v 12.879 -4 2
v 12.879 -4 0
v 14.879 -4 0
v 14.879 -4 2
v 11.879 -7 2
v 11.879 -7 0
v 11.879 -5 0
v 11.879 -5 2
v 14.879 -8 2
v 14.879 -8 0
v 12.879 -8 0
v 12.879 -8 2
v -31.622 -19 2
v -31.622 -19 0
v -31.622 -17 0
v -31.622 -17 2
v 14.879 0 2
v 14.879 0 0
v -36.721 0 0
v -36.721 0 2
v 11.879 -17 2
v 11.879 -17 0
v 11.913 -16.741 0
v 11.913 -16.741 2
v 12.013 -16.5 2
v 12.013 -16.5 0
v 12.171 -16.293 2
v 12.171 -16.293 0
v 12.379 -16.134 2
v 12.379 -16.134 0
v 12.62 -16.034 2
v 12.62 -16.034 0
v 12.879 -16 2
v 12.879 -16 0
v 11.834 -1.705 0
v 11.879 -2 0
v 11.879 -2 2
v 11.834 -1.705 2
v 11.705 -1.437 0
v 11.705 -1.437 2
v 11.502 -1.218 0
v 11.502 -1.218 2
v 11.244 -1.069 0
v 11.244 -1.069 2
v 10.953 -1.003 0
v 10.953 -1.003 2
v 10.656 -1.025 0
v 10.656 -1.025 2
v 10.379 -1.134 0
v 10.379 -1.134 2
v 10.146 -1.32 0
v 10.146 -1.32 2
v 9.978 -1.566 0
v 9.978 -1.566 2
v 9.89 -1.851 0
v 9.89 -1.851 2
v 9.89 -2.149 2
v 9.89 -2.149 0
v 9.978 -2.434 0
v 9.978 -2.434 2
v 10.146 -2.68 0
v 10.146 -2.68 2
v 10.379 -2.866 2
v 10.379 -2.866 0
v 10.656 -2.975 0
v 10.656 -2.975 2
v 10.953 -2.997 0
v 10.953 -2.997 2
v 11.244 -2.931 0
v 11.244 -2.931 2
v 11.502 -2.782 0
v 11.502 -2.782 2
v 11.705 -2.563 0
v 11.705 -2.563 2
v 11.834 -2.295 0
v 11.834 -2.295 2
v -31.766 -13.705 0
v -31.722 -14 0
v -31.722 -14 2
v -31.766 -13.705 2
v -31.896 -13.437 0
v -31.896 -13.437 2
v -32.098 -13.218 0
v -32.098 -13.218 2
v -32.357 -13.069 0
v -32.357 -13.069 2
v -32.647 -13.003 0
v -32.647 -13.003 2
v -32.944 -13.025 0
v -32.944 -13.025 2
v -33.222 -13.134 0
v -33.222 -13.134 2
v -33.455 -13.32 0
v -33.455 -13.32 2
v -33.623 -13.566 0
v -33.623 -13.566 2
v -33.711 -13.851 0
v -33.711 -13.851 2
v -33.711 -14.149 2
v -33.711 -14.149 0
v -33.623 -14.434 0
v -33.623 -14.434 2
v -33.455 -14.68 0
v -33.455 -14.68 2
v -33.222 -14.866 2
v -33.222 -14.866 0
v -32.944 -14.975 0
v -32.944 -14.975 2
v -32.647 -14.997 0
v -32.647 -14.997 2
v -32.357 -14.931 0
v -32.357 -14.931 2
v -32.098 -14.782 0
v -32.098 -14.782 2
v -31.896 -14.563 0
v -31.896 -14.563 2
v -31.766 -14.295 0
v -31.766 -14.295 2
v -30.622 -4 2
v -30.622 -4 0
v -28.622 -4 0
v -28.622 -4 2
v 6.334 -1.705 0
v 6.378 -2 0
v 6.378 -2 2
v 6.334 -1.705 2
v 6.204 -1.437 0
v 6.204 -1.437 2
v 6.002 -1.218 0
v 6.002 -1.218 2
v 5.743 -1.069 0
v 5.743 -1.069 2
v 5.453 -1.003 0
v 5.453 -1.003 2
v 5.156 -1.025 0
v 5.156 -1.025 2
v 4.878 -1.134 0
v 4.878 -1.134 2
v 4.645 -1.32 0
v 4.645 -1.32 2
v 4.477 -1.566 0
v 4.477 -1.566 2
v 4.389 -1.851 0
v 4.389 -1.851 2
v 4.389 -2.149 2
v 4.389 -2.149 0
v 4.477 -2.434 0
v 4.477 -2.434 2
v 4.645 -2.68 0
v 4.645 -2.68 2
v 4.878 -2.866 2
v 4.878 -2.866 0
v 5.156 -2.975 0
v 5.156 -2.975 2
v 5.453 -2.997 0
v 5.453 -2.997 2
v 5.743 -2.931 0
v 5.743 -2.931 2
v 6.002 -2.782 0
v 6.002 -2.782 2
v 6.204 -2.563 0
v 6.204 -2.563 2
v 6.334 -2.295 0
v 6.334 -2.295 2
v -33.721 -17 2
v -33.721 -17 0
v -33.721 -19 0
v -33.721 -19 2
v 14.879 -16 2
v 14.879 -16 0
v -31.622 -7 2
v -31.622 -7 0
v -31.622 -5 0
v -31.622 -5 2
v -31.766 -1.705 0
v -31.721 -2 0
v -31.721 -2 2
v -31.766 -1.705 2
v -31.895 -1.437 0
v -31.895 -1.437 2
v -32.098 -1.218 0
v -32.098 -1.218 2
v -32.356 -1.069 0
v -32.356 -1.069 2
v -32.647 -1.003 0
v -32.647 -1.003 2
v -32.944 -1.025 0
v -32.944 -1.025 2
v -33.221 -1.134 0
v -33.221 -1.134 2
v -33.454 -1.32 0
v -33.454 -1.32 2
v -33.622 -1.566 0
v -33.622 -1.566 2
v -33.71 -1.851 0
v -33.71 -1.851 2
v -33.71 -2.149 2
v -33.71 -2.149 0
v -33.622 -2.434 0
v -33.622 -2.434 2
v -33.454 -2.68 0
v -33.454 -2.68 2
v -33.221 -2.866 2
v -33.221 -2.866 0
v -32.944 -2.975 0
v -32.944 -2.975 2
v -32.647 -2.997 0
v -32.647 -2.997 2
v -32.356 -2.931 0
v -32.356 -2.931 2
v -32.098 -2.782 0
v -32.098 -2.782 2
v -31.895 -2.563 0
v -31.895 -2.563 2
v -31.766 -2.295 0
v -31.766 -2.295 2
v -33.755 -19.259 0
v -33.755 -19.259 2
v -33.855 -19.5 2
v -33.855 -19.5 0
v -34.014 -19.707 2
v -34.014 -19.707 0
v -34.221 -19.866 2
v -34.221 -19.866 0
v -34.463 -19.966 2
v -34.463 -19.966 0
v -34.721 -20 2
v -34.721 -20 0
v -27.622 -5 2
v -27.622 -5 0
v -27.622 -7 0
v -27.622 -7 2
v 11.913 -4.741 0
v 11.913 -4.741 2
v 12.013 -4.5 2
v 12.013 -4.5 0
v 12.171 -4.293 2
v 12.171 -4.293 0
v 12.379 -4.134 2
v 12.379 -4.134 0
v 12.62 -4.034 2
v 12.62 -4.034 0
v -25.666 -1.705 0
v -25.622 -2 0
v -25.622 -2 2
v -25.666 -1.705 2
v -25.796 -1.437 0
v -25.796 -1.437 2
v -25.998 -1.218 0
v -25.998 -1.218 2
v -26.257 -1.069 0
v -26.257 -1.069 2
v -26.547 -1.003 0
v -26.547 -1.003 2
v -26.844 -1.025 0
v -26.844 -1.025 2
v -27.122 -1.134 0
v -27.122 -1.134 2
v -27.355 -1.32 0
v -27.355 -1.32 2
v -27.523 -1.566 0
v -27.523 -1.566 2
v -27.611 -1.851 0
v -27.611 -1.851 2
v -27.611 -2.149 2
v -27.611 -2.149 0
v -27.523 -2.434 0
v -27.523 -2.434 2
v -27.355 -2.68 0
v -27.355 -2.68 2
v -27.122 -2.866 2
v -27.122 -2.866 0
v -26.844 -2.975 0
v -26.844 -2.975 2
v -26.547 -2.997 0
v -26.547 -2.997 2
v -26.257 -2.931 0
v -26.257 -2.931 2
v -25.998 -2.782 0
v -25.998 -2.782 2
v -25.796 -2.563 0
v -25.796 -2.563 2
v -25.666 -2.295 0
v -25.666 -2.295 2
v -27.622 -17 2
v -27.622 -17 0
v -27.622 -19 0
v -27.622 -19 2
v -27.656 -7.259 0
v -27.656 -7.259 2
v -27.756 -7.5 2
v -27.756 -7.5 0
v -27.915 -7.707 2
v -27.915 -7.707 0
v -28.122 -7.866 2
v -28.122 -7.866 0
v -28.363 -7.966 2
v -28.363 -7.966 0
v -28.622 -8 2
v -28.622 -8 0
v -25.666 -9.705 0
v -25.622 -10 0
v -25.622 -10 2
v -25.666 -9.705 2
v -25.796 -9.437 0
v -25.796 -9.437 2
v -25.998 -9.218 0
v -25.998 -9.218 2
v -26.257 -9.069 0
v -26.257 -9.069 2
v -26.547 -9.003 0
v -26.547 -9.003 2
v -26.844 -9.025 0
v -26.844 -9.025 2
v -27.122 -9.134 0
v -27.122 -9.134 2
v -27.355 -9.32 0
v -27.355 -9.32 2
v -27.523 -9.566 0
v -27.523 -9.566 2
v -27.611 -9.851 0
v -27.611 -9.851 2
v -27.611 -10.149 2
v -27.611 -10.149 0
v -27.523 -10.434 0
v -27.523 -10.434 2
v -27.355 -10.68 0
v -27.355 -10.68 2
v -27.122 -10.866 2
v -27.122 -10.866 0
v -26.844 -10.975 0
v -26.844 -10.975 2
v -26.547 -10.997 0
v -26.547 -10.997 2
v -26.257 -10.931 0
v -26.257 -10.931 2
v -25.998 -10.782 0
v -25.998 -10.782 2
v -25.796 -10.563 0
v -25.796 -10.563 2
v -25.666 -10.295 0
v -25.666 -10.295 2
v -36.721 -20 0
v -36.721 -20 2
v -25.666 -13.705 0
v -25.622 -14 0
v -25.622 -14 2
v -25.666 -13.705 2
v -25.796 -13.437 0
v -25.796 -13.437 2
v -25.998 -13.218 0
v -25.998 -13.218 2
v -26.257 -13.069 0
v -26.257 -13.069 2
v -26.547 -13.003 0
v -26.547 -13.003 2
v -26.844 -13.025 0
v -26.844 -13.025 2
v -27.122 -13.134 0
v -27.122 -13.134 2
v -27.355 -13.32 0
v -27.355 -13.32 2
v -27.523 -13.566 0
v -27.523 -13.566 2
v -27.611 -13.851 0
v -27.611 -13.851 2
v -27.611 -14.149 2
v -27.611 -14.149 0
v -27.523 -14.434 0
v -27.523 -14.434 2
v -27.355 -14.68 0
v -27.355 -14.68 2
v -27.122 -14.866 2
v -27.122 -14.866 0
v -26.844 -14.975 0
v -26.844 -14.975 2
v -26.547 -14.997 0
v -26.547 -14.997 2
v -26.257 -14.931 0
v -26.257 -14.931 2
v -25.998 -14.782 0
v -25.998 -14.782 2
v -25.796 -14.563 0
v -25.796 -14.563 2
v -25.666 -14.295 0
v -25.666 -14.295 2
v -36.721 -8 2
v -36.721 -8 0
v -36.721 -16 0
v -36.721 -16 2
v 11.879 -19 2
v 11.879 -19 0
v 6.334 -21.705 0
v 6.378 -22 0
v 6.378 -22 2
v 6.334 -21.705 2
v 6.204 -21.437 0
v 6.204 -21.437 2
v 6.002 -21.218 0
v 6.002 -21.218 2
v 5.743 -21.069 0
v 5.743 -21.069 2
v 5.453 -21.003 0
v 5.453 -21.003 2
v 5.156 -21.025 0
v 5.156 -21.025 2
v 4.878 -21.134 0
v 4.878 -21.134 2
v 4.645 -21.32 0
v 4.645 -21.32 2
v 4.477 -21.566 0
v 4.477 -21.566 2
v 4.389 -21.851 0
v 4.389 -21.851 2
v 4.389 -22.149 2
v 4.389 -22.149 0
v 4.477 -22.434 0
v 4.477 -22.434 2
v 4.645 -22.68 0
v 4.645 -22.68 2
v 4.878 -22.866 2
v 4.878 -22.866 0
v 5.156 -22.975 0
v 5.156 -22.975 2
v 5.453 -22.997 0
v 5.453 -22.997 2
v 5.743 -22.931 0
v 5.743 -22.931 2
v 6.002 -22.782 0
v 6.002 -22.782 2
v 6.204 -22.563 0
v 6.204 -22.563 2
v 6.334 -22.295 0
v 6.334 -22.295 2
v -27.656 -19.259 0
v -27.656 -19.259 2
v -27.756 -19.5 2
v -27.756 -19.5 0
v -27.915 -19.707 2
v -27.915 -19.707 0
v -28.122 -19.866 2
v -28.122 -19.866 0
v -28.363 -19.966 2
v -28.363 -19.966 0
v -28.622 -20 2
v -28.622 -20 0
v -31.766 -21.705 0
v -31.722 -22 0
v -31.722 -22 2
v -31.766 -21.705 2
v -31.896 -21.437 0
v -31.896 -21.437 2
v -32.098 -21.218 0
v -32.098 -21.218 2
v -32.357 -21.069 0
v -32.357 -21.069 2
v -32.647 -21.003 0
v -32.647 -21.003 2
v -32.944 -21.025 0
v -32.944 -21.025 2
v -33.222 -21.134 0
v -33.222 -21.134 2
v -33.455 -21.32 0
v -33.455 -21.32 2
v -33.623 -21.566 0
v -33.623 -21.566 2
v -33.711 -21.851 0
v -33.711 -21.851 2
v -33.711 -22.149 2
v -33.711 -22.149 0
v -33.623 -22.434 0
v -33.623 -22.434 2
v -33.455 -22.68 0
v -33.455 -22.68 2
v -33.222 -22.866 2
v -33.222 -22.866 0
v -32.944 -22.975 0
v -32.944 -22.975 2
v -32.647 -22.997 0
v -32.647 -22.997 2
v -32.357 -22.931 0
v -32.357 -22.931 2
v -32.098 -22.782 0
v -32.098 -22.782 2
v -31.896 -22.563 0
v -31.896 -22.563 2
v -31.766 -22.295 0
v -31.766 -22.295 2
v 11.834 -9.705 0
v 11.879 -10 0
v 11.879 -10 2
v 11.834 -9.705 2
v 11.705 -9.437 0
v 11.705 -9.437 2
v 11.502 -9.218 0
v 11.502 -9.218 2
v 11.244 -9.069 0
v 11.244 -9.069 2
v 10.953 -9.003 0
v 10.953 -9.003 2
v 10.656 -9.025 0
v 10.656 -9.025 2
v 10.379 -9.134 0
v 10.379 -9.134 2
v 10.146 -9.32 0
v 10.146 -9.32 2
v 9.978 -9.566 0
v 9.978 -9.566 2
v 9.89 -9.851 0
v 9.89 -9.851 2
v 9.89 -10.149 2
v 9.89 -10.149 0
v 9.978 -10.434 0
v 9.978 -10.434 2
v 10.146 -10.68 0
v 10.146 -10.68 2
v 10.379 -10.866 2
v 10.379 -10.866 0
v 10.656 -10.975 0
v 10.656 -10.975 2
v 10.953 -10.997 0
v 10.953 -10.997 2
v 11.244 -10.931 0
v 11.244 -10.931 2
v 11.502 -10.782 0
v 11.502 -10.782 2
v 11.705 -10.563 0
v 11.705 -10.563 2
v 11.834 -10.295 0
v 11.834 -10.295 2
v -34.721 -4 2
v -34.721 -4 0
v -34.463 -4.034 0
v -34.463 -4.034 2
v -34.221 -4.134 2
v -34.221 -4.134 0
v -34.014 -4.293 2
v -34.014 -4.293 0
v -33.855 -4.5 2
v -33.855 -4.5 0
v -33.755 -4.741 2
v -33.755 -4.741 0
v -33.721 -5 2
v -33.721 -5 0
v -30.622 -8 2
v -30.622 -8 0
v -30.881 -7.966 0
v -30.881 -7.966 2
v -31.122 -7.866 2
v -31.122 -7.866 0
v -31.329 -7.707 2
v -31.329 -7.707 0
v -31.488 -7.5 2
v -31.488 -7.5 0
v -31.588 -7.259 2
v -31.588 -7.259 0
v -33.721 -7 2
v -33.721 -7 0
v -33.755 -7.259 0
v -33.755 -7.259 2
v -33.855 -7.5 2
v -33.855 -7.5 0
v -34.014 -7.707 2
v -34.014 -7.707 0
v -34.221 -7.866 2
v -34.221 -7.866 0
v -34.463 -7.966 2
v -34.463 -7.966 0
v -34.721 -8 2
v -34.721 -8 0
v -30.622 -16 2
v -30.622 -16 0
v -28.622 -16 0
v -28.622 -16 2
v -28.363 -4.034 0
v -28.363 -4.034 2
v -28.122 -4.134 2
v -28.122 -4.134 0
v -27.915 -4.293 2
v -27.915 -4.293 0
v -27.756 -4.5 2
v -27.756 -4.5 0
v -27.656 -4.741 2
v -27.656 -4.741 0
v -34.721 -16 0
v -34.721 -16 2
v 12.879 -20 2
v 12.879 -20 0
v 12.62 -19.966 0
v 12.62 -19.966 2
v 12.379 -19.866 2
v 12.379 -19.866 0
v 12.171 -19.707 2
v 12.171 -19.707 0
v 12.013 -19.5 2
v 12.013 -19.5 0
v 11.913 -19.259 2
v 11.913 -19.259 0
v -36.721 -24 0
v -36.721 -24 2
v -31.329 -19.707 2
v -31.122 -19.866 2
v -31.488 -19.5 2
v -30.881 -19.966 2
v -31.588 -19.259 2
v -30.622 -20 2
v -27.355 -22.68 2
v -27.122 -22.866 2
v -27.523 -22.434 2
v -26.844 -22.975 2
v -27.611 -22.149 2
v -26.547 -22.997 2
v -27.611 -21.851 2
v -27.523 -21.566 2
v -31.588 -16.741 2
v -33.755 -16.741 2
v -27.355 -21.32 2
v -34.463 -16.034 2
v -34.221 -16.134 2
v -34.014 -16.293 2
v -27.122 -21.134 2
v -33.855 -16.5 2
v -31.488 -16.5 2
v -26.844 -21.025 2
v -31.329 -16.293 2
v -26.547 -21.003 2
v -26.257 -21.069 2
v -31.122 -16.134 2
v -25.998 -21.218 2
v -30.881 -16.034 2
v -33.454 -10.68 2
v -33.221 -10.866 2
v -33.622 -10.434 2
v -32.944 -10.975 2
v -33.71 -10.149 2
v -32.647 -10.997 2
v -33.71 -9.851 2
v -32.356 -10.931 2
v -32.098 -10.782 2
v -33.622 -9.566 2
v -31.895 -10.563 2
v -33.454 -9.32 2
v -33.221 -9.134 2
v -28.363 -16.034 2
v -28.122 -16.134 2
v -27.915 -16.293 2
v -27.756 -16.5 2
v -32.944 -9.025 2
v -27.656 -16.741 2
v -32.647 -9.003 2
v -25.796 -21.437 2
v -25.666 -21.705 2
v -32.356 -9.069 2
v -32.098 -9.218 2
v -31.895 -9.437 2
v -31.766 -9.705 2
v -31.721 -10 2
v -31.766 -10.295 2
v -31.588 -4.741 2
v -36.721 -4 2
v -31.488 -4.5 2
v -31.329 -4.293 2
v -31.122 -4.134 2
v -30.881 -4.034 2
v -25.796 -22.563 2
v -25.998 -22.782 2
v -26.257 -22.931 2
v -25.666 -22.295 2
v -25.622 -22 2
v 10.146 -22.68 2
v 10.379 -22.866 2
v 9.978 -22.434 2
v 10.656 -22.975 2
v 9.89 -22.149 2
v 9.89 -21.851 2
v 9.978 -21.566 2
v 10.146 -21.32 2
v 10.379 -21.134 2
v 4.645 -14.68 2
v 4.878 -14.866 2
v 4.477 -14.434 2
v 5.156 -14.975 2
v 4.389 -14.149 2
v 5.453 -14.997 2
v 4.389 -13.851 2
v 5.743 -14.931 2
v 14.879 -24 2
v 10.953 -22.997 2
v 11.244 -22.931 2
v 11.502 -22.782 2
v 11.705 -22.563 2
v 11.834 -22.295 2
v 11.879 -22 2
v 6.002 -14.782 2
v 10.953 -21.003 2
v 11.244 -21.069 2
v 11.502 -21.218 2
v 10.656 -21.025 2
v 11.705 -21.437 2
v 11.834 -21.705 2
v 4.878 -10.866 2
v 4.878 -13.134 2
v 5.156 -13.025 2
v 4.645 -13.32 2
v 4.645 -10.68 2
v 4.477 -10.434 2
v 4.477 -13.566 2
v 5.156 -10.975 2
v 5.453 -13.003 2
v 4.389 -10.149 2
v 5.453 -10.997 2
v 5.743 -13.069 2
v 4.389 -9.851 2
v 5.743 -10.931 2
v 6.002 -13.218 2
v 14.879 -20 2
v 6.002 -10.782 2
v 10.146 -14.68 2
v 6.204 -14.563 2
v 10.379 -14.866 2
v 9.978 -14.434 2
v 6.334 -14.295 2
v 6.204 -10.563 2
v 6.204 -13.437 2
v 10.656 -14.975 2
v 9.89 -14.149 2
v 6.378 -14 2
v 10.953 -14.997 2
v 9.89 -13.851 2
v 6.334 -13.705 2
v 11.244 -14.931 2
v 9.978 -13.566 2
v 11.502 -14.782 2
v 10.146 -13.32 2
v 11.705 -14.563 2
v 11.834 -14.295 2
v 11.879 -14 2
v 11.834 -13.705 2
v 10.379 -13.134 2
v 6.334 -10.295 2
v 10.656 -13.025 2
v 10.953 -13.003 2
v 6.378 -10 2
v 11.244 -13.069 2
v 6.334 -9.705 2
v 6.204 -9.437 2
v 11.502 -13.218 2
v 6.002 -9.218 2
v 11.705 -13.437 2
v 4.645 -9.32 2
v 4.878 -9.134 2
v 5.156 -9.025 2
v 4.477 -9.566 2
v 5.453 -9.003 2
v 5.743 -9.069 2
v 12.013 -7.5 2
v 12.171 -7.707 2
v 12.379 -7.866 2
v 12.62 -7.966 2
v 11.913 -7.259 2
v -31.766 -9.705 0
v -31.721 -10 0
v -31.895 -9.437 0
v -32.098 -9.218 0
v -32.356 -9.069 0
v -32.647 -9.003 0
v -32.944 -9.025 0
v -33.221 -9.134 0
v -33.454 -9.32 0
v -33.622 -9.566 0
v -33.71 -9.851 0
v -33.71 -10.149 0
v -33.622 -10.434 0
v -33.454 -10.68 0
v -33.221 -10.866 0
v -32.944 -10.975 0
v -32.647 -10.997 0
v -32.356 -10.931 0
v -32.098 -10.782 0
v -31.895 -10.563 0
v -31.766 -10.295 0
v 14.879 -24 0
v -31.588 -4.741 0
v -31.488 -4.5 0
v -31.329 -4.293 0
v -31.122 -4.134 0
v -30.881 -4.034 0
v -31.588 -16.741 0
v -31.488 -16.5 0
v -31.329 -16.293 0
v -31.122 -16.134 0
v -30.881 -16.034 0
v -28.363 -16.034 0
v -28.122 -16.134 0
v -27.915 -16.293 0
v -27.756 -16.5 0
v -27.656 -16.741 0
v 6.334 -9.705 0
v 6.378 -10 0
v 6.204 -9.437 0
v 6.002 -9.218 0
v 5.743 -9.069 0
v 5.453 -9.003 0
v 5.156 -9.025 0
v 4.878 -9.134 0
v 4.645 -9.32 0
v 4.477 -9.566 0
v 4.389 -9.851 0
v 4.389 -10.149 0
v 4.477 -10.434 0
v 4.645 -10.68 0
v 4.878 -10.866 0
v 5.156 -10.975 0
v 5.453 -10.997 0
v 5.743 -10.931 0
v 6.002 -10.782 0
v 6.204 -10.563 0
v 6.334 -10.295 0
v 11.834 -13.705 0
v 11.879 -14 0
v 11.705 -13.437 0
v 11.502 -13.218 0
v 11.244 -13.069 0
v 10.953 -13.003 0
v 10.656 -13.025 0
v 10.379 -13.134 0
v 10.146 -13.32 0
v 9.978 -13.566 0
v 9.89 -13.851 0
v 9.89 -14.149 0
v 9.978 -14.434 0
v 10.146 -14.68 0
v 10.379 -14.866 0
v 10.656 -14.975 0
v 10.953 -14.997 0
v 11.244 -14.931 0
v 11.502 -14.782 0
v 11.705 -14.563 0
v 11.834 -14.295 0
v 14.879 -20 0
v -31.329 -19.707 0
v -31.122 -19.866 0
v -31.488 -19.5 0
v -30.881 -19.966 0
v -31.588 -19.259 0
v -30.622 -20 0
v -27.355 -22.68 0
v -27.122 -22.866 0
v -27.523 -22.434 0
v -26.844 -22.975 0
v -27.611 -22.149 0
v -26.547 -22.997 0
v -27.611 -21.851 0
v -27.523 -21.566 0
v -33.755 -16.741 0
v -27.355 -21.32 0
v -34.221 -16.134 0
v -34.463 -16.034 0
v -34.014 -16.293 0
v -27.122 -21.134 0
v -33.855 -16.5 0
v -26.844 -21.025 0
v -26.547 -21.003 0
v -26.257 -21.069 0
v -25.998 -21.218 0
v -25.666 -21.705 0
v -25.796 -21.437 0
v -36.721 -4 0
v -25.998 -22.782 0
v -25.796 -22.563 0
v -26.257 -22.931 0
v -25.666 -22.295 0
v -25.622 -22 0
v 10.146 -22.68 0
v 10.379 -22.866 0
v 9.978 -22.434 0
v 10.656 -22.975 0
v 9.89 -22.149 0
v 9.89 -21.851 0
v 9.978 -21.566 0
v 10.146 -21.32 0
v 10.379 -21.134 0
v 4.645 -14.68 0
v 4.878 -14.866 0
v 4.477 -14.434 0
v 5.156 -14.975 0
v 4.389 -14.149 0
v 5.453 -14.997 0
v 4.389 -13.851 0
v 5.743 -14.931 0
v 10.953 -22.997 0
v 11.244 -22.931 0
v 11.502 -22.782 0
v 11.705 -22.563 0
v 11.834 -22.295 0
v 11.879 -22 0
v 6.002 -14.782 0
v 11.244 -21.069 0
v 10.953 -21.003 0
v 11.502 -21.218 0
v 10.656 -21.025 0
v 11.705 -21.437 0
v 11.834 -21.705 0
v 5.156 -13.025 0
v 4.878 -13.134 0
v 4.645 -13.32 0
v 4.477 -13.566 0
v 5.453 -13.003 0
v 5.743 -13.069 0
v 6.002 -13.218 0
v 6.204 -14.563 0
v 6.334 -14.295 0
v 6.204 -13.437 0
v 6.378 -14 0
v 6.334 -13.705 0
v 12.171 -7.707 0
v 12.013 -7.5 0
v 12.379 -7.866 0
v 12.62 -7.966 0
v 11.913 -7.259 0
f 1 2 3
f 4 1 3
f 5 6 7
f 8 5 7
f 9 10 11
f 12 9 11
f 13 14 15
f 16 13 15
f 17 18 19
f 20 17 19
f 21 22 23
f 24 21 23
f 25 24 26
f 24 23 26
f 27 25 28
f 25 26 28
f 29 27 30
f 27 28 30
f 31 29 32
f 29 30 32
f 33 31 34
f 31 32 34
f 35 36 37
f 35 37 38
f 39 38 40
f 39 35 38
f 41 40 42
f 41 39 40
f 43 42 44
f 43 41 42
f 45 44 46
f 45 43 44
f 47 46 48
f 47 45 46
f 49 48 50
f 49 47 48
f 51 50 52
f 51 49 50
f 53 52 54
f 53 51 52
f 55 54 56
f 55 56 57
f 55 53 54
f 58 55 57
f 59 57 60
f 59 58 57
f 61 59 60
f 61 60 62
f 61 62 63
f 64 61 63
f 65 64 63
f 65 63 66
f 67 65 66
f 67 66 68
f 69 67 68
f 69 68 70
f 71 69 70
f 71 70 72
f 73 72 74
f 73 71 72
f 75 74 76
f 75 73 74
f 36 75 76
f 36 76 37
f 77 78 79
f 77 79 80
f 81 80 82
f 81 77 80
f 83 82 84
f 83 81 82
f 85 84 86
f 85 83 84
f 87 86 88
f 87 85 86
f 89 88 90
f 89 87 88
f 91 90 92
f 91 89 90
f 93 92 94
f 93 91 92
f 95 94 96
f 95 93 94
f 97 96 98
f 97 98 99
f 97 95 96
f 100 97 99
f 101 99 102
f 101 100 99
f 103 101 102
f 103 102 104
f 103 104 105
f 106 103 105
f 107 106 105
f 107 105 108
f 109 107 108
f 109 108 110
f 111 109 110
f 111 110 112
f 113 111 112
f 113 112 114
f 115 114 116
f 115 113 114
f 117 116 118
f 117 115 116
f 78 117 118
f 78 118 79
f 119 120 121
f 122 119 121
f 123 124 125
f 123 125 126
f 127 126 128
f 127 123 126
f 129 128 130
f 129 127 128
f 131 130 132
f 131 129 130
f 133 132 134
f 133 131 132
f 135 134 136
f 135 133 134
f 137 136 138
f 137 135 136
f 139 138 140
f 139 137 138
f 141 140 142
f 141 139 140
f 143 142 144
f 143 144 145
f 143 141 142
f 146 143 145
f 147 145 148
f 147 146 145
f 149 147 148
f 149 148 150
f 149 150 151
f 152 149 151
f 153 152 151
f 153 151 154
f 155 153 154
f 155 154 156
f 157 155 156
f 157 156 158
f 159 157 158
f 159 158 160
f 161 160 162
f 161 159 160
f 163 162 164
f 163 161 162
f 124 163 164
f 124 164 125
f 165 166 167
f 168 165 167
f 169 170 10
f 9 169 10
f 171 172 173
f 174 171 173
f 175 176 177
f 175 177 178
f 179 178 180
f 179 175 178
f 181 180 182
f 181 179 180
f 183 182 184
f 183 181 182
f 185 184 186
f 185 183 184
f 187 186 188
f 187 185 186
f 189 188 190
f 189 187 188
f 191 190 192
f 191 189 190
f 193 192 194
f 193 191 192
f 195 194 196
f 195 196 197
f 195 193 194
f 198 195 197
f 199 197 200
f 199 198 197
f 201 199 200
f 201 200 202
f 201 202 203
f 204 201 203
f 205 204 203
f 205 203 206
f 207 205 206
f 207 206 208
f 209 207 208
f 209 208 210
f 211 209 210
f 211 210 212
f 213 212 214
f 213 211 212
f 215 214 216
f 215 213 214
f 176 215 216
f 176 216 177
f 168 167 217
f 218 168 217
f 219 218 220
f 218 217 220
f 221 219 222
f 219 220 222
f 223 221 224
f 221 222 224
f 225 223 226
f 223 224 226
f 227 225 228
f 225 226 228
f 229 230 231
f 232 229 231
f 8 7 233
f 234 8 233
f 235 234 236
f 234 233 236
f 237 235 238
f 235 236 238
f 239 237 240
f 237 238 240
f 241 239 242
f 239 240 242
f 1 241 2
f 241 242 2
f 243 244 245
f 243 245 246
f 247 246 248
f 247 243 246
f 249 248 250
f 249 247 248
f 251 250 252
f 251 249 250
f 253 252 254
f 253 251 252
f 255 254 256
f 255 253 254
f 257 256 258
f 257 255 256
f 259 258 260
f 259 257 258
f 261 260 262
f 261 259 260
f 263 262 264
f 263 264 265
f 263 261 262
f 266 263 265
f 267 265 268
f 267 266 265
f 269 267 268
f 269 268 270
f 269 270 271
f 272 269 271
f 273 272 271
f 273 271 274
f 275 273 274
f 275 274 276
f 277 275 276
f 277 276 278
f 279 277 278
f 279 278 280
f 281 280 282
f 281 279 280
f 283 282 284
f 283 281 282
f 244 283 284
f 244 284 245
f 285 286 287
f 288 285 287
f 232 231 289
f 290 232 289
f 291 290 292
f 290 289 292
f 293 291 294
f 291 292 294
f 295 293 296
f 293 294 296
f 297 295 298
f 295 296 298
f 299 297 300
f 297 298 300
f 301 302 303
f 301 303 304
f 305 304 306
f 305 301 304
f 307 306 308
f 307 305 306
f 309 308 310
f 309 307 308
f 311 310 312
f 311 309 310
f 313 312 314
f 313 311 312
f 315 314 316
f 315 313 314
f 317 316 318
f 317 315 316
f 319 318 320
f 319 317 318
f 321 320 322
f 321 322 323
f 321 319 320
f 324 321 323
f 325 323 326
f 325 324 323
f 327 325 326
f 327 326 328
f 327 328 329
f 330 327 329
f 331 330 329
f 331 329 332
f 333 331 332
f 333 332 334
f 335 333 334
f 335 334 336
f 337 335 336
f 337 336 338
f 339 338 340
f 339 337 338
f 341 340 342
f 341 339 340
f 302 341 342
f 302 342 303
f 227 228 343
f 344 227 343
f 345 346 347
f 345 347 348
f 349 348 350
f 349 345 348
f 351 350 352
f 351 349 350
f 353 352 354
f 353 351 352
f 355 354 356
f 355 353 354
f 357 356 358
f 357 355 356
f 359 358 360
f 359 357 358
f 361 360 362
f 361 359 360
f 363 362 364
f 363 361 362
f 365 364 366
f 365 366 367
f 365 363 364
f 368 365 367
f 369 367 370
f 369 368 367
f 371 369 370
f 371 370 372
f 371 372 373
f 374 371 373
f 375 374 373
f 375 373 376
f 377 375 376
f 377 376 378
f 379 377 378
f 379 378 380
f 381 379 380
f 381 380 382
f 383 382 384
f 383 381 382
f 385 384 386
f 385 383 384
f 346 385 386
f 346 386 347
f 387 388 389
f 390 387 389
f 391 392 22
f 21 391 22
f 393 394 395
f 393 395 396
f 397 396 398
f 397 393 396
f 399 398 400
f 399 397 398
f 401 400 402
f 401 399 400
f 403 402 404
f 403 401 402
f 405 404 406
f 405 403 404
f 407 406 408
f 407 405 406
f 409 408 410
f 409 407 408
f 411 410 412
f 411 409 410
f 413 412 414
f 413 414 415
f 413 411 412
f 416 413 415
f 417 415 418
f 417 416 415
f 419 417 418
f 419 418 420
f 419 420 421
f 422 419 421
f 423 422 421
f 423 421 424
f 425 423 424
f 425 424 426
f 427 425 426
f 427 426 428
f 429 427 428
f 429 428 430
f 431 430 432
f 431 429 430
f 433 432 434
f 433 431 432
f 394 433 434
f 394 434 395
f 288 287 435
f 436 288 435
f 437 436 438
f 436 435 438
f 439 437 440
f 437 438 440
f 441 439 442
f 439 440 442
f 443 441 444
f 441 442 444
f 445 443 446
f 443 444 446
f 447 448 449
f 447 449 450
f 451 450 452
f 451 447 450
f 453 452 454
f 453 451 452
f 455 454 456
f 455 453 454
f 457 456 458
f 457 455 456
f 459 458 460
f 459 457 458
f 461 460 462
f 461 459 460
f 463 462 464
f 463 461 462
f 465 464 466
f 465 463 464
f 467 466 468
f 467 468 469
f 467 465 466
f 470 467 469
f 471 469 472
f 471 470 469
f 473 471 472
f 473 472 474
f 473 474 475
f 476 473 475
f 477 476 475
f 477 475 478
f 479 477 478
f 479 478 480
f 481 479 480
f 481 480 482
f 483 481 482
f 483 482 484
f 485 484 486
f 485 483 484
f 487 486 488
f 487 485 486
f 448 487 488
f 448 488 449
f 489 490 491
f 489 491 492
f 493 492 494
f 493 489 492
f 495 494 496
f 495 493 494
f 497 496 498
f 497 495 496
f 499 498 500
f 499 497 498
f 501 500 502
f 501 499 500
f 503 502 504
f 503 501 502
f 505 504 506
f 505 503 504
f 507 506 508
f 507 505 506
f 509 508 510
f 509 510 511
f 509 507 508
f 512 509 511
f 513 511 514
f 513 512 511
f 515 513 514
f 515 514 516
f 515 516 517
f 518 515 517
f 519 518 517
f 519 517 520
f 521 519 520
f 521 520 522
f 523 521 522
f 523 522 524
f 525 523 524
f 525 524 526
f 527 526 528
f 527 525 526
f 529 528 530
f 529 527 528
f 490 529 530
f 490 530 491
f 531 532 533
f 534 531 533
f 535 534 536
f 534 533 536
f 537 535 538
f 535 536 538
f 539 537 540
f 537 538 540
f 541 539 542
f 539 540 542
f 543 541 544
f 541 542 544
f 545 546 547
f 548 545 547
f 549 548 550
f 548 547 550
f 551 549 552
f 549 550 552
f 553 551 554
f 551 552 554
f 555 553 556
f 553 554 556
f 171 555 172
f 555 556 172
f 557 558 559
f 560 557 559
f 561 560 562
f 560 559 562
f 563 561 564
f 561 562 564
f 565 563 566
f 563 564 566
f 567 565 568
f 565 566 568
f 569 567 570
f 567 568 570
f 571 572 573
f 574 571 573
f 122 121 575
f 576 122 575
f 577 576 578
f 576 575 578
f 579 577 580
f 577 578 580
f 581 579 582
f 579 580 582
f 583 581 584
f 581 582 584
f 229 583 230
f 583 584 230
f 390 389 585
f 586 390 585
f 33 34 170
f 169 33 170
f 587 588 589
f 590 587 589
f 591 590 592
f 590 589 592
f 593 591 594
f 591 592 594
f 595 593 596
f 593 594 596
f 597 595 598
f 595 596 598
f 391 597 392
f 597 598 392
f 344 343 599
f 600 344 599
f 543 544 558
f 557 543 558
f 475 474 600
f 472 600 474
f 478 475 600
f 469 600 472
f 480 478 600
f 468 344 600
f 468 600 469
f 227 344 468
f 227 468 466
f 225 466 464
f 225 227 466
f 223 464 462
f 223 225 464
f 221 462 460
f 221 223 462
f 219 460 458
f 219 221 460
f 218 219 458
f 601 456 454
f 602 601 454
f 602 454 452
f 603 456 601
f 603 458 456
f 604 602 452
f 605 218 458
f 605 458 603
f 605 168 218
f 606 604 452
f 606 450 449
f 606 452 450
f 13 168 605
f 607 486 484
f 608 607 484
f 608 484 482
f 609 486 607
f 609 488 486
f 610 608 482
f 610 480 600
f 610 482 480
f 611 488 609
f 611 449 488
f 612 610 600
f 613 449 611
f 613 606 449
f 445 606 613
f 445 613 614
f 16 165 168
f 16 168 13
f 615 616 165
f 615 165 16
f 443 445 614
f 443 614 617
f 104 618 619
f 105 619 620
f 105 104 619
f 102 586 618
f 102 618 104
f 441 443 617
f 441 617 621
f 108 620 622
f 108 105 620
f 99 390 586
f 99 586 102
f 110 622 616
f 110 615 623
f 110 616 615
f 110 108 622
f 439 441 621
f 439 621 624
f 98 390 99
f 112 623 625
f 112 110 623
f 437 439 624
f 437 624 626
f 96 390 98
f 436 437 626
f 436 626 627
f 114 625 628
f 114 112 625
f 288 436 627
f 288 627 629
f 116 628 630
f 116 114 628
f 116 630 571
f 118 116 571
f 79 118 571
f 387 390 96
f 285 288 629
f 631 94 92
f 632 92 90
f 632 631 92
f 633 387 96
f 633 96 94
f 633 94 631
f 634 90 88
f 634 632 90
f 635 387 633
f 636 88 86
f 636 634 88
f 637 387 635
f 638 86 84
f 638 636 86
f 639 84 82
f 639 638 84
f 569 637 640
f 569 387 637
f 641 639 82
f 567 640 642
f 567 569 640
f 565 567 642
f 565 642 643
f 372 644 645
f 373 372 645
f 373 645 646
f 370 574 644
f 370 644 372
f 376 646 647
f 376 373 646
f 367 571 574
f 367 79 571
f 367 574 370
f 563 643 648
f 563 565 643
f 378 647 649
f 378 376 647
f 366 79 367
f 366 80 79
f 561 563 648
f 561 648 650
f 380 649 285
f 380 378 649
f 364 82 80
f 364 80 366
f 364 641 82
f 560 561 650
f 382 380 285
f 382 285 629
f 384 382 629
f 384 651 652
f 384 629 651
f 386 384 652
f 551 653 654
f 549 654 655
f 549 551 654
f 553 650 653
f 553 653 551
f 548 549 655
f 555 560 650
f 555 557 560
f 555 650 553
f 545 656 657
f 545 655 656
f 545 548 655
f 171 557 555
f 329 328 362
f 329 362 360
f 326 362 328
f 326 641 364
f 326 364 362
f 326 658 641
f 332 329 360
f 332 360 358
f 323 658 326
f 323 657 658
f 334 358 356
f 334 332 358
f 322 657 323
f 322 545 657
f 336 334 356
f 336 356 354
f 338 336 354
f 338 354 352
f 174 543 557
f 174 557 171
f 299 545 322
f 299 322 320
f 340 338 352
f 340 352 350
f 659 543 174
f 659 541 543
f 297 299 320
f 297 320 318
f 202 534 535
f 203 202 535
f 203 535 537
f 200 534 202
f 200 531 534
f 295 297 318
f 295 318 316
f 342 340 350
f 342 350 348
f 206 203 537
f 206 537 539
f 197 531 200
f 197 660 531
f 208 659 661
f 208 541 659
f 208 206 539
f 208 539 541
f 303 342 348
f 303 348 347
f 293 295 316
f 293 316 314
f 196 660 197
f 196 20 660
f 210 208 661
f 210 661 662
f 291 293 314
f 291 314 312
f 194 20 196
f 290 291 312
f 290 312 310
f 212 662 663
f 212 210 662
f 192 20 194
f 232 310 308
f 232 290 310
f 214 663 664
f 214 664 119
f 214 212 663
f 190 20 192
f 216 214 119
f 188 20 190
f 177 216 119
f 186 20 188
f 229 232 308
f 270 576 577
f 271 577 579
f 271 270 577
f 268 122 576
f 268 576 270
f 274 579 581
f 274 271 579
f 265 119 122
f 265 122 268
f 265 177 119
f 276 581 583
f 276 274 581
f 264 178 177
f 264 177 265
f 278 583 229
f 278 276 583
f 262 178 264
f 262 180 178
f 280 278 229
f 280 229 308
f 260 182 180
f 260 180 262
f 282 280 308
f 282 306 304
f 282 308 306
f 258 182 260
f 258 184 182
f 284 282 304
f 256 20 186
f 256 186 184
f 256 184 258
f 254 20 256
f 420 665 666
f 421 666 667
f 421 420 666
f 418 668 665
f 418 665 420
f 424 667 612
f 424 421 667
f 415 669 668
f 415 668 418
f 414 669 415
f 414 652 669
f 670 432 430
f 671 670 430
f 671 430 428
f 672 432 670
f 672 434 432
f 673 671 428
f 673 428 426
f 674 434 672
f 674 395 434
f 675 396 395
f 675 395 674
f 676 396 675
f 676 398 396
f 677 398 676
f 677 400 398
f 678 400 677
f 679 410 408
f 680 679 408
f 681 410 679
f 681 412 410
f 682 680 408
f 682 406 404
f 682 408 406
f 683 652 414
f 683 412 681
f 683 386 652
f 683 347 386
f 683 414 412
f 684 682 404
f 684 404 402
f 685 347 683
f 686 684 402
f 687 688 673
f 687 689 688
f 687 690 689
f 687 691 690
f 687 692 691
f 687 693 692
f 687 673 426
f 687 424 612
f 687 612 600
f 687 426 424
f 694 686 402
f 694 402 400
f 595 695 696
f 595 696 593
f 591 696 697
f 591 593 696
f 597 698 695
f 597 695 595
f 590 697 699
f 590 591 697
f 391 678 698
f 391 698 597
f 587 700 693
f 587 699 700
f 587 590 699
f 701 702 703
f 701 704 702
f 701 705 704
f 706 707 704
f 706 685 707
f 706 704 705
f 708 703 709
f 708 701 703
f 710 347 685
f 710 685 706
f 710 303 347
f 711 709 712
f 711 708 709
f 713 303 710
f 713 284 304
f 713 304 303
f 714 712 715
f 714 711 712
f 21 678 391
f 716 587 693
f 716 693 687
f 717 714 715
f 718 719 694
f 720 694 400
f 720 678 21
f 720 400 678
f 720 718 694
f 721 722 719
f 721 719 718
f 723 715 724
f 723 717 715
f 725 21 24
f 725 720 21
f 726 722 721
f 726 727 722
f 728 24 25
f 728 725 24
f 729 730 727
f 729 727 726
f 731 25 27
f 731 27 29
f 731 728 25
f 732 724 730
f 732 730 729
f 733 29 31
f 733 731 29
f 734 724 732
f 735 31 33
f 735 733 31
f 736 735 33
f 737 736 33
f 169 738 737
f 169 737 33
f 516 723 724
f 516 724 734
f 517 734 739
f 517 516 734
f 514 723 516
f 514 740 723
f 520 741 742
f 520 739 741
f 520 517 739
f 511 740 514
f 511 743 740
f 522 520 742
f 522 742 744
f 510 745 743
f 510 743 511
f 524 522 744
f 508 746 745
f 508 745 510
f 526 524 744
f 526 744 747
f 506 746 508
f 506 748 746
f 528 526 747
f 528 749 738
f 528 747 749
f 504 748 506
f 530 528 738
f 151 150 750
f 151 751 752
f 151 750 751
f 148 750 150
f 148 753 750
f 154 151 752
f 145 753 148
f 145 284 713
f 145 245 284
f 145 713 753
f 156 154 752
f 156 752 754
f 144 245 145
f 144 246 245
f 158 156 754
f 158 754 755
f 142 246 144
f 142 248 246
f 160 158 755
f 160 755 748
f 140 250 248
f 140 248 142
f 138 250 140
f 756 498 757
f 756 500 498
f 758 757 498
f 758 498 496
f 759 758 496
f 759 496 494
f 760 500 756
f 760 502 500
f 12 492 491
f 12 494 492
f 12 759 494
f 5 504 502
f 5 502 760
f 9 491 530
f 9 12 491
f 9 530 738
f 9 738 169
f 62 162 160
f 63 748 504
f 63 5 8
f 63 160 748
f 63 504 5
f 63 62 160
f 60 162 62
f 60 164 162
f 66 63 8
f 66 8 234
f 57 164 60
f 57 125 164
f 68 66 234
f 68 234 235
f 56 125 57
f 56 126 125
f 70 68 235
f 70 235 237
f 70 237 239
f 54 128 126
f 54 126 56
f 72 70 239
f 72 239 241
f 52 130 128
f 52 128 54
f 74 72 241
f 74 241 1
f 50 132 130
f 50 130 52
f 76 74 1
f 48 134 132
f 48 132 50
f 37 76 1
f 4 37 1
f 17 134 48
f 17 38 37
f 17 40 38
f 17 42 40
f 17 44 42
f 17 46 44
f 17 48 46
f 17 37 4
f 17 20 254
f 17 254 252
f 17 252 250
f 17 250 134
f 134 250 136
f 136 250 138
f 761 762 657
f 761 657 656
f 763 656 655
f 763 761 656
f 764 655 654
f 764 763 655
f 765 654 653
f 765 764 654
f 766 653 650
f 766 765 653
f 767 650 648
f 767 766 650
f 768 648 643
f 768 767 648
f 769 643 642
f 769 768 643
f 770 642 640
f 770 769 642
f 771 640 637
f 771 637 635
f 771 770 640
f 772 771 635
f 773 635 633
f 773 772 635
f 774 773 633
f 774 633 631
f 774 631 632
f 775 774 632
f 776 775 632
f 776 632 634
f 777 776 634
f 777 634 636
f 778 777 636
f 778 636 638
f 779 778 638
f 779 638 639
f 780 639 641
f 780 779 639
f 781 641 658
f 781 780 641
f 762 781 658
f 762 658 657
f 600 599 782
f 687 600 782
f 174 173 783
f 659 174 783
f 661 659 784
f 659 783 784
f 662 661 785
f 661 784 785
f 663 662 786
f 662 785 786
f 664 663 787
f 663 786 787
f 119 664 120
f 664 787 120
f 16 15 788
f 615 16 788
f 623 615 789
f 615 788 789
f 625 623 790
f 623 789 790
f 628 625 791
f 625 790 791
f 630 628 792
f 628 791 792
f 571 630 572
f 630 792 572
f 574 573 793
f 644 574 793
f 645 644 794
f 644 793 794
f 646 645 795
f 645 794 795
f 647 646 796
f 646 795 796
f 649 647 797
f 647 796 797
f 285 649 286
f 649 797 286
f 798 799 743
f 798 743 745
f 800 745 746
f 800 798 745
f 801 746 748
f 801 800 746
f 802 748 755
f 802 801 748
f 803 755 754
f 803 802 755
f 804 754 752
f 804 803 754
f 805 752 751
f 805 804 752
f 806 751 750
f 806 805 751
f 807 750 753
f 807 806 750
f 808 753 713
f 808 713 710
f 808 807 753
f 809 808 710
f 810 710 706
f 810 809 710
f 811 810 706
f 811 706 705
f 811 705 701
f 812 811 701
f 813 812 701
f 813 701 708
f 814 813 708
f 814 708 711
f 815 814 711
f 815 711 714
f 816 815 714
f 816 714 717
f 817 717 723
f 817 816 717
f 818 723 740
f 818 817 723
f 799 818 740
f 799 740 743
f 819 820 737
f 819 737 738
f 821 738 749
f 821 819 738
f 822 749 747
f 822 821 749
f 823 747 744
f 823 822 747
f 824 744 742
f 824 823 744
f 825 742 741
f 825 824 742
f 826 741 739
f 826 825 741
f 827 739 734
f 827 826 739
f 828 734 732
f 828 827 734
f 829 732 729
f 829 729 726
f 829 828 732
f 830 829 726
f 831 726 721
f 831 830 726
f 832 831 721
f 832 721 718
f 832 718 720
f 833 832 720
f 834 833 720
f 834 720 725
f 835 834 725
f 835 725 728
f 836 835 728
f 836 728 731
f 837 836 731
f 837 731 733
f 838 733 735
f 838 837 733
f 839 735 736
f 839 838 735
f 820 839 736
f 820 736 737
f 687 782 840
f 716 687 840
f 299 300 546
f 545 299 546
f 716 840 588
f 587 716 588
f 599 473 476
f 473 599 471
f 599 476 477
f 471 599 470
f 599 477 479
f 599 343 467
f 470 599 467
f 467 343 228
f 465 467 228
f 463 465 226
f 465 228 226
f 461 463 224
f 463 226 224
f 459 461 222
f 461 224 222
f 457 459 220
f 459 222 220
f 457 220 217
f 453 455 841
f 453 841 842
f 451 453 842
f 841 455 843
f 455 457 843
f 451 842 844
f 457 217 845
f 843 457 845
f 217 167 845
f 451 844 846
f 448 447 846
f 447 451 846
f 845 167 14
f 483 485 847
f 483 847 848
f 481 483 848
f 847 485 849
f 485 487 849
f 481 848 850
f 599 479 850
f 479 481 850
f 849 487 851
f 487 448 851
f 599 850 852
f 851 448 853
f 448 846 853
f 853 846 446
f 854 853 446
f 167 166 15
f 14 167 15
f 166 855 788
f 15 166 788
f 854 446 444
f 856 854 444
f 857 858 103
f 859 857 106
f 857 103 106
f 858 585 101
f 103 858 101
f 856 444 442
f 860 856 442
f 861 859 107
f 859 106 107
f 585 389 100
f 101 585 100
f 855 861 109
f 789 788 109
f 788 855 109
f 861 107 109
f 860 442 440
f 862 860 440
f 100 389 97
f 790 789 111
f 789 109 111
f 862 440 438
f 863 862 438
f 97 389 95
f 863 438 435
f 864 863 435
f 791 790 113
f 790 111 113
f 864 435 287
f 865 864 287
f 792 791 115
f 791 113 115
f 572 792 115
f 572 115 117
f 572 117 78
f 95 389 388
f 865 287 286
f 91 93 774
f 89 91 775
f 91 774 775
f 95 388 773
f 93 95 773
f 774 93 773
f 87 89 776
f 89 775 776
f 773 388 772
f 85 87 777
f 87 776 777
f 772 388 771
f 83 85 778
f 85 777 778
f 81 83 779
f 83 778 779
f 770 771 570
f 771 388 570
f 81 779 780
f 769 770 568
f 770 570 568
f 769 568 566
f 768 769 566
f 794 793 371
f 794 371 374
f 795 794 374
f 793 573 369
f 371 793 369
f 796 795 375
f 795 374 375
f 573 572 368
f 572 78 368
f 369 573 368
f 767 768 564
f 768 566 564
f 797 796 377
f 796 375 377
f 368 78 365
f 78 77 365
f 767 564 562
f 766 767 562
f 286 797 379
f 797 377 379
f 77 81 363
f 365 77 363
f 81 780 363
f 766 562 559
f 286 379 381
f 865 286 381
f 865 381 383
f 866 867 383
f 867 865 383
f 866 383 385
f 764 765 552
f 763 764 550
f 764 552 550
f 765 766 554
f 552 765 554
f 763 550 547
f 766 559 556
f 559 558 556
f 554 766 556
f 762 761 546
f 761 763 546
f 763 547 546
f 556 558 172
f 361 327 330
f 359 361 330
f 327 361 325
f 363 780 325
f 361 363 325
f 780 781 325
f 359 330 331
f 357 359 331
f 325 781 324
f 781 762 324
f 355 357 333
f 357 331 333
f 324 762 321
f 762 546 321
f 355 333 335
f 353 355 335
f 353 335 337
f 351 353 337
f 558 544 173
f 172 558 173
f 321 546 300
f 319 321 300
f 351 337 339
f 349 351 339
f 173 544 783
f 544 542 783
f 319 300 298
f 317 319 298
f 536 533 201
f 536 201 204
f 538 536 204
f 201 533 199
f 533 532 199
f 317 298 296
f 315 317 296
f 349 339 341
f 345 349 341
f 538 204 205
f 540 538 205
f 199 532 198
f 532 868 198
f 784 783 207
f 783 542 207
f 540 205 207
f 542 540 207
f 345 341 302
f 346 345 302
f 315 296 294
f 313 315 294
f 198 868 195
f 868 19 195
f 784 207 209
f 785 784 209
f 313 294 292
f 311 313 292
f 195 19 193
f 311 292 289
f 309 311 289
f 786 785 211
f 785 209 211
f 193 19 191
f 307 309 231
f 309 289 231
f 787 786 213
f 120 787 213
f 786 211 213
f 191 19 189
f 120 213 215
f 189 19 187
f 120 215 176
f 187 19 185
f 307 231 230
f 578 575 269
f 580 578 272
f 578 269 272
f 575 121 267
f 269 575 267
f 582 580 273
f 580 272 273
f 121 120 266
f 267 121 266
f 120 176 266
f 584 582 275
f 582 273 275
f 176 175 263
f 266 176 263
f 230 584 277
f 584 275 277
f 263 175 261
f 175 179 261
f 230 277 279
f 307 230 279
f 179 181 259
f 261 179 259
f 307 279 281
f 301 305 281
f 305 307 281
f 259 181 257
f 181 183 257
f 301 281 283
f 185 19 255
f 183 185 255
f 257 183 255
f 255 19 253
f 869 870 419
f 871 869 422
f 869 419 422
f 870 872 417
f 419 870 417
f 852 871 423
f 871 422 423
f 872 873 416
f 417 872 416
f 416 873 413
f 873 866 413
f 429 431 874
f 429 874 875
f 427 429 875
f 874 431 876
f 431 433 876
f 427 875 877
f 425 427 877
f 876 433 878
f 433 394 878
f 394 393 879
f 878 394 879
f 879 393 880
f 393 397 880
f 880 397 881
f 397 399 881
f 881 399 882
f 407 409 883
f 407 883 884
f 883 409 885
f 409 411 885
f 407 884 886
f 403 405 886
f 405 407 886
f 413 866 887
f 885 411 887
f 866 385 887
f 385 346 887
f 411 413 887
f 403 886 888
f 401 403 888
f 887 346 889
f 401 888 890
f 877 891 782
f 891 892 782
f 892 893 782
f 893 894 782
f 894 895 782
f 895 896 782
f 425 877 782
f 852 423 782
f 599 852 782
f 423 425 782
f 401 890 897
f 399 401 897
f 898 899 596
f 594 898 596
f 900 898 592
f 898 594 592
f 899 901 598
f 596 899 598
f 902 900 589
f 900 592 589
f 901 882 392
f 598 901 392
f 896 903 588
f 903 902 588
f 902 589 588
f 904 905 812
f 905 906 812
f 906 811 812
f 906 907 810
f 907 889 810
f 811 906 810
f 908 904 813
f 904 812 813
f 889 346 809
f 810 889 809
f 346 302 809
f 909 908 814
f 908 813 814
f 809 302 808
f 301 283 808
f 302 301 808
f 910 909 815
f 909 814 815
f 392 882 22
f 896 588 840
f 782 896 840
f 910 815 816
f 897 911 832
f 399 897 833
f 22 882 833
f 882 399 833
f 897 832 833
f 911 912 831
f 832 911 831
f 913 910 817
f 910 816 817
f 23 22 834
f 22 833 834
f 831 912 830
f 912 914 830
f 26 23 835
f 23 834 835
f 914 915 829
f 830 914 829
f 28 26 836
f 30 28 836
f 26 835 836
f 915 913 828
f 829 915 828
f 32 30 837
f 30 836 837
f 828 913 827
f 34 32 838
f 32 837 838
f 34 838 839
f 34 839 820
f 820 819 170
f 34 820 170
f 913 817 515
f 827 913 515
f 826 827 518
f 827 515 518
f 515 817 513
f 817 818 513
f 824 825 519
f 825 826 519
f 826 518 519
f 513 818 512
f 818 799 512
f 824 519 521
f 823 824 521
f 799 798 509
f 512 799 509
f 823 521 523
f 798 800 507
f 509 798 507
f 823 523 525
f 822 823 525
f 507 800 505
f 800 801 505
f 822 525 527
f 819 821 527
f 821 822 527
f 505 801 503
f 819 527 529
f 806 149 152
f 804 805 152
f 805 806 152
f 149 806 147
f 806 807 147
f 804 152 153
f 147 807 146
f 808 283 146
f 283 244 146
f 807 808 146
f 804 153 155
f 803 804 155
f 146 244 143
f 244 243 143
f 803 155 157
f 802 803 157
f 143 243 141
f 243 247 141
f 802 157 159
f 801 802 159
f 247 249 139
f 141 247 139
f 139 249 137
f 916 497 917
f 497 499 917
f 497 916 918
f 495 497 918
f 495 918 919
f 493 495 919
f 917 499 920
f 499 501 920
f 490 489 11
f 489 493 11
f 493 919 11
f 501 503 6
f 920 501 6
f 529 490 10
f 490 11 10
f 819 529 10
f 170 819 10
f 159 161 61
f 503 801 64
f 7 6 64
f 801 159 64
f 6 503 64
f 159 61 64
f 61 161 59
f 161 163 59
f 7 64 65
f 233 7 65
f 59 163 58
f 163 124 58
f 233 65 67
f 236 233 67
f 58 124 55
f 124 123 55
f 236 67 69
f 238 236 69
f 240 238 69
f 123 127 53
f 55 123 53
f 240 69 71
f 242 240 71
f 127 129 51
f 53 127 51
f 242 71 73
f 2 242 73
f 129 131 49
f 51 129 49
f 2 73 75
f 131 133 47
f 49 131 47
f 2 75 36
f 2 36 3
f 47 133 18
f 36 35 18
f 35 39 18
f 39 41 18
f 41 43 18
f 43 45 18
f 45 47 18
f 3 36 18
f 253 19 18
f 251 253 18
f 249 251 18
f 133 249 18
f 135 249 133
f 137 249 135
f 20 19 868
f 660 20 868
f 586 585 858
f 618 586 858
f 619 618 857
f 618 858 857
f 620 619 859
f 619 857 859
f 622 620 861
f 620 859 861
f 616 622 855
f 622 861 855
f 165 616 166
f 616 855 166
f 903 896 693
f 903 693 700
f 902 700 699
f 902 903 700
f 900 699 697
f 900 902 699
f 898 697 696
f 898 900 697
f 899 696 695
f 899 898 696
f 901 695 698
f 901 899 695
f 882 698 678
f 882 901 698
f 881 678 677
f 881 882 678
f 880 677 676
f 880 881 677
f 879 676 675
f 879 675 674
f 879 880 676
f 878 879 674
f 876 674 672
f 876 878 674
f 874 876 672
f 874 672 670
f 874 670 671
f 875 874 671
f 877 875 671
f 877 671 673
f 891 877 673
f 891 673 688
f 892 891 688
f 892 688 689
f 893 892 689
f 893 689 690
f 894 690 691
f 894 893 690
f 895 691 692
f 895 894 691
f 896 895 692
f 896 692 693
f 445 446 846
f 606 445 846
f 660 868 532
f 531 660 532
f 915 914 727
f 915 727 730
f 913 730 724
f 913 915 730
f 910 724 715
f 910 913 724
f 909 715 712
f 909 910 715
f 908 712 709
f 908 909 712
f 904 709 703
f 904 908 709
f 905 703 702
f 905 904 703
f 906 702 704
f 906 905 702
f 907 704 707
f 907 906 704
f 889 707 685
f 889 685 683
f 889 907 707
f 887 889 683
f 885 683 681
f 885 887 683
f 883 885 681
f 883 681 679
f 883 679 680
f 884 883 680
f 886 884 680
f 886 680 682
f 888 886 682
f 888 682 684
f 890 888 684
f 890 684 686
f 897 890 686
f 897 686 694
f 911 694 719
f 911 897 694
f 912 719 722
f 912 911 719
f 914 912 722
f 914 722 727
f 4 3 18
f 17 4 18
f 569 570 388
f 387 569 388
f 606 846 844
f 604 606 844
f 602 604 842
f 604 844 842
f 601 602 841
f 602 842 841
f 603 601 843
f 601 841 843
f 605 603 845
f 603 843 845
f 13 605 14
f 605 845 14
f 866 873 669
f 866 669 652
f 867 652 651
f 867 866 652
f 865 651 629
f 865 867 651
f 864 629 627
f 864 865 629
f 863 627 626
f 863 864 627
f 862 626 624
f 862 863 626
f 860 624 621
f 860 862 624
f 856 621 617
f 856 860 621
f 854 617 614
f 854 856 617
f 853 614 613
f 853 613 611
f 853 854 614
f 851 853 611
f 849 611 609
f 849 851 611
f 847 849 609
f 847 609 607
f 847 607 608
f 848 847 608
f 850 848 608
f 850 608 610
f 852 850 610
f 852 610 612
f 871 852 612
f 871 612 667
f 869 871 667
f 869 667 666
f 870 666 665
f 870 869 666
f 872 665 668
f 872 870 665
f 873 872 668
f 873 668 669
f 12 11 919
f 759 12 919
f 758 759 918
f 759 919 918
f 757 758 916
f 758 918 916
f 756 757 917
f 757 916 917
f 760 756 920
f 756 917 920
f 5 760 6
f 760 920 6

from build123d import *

# Parameters (mm, degrees)
SKETCH_14_R     = 1
EXTRUDE_1_DEPTH = 2


with BuildPart() as part:
    # 草圖14 → 填料-伸長1 (new body)
    with BuildSketch(Plane.XY):
        with BuildLine():
            Line((-33.721403204, -5), (-33.721403204, -7))
            ThreePointArc((-33.721403204, -7), (-34.014296423, -7.707106781), (-34.721403204, -8))
            Line((-34.721403204, -8), (-36.721403204, -8))
            Line((-36.721403204, -8), (-36.721403204, -16))
            Line((-36.721403204, -16), (-34.721403204, -16))
            ThreePointArc((-34.721403204, -16), (-34.014296423, -16.292893219), (-33.721403204, -17))
            Line((-33.721403204, -17), (-33.721403204, -19))
            ThreePointArc((-33.721403204, -19), (-34.014296423, -19.707106781), (-34.721403204, -20))
            Line((-34.721403204, -20), (-36.721403204, -20))
            Line((-36.721403204, -20), (-36.721403204, -24))
            Line((-36.721403204, -24), (14.878596796, -24))
            Line((14.878596796, -24), (14.878596796, -20))
            Line((14.878596796, -20), (12.878596796, -20))
            ThreePointArc((12.878596796, -20), (12.171490014, -19.707106781), (11.878596796, -19))
            Line((11.878596796, -19), (11.878596796, -17))
            ThreePointArc((11.878596796, -17), (12.171490014, -16.292893219), (12.878596796, -16))
            Line((12.878596796, -16), (14.878596796, -16))
            Line((14.878596796, -16), (14.878596796, -8))
            Line((14.878596796, -8), (12.878596796, -8))
            ThreePointArc((12.878596796, -8), (12.171490014, -7.707106781), (11.878596796, -7))
            Line((11.878596796, -7), (11.878596796, -5))
            ThreePointArc((11.878596796, -5), (12.171490014, -4.292893219), (12.878596796, -4))
            Line((12.878596796, -4), (14.878596796, -4))
            Line((14.878596796, -4), (14.878596796, 0))
            Line((14.878596796, 0), (-36.721403204, 0))
            Line((-36.721403204, 0), (-36.721403204, -4))
            Line((-36.721403204, -4), (-34.721403204, -4))
            ThreePointArc((-34.721403204, -4), (-34.014296423, -4.292893219), (-33.721403204, -5))
        make_face()
        with Locations((10.878596796, -14)):
            Circle(SKETCH_14_R, mode=Mode.SUBTRACT)
        with Locations((5.378124186, -14)):
            Circle(SKETCH_14_R, mode=Mode.SUBTRACT)
        with Locations((5.378124186, -22)):
            Circle(SKETCH_14_R, mode=Mode.SUBTRACT)
        with Locations((10.878596796, -22)):
            Circle(SKETCH_14_R, mode=Mode.SUBTRACT)
        with Locations((-26.621875814, -14)):
            Circle(SKETCH_14_R, mode=Mode.SUBTRACT)
        with Locations((-32.721875814, -14)):
            Circle(SKETCH_14_R, mode=Mode.SUBTRACT)
        with Locations((-32.721875814, -22)):
            Circle(SKETCH_14_R, mode=Mode.SUBTRACT)
        with Locations((-26.621875814, -22)):
            Circle(SKETCH_14_R, mode=Mode.SUBTRACT)
        with Locations((5.378124186, -2)):
            Circle(SKETCH_14_R, mode=Mode.SUBTRACT)
        with Locations((5.378124186, -10)):
            Circle(SKETCH_14_R, mode=Mode.SUBTRACT)
        with Locations((10.878596796, -10)):
            Circle(SKETCH_14_R, mode=Mode.SUBTRACT)
        with Locations((-32.721403204, -2)):
            Circle(SKETCH_14_R, mode=Mode.SUBTRACT)
        with Locations((-26.621875814, -2)):
            Circle(SKETCH_14_R, mode=Mode.SUBTRACT)
        with Locations((-32.721403204, -10)):
            Circle(SKETCH_14_R, mode=Mode.SUBTRACT)
        with Locations((-26.621875814, -10)):
            Circle(SKETCH_14_R, mode=Mode.SUBTRACT)
        with Locations((10.878596796, -2)):
            Circle(SKETCH_14_R, mode=Mode.SUBTRACT)
        with BuildLine():
            Line((-30.621875814, -4), (-28.621875814, -4))
            ThreePointArc((-28.621875814, -4), (-27.914769033, -4.292893219), (-27.621875814, -5))
            Line((-27.621875814, -5), (-27.621875814, -7))
            ThreePointArc((-27.621875814, -7), (-27.914769033, -7.707106781), (-28.621875814, -8))
            Line((-28.621875814, -8), (-30.621875814, -8))
            ThreePointArc((-30.621875814, -8), (-31.328982596, -7.707106781), (-31.621875814, -7))
            Line((-31.621875814, -7), (-31.621875814, -5))
            ThreePointArc((-31.621875814, -5), (-31.328982596, -4.292893219), (-30.621875814, -4))
        make_face(mode=Mode.SUBTRACT)
        with BuildLine():
            Line((-27.621875814, -17), (-27.621875814, -19))
            ThreePointArc((-27.621875814, -19), (-27.914769033, -19.707106781), (-28.621875814, -20))
            Line((-28.621875814, -20), (-30.621875814, -20))
            ThreePointArc((-30.621875814, -20), (-31.328982596, -19.707106781), (-31.621875814, -19))
            Line((-31.621875814, -19), (-31.621875814, -17))
            ThreePointArc((-31.621875814, -17), (-31.328982596, -16.292893219), (-30.621875814, -16))
            Line((-30.621875814, -16), (-28.621875814, -16))
            ThreePointArc((-28.621875814, -16), (-27.914769033, -16.292893219), (-27.621875814, -17))
        make_face(mode=Mode.SUBTRACT)
    extrude(amount=EXTRUDE_1_DEPTH)


solid = part.part
